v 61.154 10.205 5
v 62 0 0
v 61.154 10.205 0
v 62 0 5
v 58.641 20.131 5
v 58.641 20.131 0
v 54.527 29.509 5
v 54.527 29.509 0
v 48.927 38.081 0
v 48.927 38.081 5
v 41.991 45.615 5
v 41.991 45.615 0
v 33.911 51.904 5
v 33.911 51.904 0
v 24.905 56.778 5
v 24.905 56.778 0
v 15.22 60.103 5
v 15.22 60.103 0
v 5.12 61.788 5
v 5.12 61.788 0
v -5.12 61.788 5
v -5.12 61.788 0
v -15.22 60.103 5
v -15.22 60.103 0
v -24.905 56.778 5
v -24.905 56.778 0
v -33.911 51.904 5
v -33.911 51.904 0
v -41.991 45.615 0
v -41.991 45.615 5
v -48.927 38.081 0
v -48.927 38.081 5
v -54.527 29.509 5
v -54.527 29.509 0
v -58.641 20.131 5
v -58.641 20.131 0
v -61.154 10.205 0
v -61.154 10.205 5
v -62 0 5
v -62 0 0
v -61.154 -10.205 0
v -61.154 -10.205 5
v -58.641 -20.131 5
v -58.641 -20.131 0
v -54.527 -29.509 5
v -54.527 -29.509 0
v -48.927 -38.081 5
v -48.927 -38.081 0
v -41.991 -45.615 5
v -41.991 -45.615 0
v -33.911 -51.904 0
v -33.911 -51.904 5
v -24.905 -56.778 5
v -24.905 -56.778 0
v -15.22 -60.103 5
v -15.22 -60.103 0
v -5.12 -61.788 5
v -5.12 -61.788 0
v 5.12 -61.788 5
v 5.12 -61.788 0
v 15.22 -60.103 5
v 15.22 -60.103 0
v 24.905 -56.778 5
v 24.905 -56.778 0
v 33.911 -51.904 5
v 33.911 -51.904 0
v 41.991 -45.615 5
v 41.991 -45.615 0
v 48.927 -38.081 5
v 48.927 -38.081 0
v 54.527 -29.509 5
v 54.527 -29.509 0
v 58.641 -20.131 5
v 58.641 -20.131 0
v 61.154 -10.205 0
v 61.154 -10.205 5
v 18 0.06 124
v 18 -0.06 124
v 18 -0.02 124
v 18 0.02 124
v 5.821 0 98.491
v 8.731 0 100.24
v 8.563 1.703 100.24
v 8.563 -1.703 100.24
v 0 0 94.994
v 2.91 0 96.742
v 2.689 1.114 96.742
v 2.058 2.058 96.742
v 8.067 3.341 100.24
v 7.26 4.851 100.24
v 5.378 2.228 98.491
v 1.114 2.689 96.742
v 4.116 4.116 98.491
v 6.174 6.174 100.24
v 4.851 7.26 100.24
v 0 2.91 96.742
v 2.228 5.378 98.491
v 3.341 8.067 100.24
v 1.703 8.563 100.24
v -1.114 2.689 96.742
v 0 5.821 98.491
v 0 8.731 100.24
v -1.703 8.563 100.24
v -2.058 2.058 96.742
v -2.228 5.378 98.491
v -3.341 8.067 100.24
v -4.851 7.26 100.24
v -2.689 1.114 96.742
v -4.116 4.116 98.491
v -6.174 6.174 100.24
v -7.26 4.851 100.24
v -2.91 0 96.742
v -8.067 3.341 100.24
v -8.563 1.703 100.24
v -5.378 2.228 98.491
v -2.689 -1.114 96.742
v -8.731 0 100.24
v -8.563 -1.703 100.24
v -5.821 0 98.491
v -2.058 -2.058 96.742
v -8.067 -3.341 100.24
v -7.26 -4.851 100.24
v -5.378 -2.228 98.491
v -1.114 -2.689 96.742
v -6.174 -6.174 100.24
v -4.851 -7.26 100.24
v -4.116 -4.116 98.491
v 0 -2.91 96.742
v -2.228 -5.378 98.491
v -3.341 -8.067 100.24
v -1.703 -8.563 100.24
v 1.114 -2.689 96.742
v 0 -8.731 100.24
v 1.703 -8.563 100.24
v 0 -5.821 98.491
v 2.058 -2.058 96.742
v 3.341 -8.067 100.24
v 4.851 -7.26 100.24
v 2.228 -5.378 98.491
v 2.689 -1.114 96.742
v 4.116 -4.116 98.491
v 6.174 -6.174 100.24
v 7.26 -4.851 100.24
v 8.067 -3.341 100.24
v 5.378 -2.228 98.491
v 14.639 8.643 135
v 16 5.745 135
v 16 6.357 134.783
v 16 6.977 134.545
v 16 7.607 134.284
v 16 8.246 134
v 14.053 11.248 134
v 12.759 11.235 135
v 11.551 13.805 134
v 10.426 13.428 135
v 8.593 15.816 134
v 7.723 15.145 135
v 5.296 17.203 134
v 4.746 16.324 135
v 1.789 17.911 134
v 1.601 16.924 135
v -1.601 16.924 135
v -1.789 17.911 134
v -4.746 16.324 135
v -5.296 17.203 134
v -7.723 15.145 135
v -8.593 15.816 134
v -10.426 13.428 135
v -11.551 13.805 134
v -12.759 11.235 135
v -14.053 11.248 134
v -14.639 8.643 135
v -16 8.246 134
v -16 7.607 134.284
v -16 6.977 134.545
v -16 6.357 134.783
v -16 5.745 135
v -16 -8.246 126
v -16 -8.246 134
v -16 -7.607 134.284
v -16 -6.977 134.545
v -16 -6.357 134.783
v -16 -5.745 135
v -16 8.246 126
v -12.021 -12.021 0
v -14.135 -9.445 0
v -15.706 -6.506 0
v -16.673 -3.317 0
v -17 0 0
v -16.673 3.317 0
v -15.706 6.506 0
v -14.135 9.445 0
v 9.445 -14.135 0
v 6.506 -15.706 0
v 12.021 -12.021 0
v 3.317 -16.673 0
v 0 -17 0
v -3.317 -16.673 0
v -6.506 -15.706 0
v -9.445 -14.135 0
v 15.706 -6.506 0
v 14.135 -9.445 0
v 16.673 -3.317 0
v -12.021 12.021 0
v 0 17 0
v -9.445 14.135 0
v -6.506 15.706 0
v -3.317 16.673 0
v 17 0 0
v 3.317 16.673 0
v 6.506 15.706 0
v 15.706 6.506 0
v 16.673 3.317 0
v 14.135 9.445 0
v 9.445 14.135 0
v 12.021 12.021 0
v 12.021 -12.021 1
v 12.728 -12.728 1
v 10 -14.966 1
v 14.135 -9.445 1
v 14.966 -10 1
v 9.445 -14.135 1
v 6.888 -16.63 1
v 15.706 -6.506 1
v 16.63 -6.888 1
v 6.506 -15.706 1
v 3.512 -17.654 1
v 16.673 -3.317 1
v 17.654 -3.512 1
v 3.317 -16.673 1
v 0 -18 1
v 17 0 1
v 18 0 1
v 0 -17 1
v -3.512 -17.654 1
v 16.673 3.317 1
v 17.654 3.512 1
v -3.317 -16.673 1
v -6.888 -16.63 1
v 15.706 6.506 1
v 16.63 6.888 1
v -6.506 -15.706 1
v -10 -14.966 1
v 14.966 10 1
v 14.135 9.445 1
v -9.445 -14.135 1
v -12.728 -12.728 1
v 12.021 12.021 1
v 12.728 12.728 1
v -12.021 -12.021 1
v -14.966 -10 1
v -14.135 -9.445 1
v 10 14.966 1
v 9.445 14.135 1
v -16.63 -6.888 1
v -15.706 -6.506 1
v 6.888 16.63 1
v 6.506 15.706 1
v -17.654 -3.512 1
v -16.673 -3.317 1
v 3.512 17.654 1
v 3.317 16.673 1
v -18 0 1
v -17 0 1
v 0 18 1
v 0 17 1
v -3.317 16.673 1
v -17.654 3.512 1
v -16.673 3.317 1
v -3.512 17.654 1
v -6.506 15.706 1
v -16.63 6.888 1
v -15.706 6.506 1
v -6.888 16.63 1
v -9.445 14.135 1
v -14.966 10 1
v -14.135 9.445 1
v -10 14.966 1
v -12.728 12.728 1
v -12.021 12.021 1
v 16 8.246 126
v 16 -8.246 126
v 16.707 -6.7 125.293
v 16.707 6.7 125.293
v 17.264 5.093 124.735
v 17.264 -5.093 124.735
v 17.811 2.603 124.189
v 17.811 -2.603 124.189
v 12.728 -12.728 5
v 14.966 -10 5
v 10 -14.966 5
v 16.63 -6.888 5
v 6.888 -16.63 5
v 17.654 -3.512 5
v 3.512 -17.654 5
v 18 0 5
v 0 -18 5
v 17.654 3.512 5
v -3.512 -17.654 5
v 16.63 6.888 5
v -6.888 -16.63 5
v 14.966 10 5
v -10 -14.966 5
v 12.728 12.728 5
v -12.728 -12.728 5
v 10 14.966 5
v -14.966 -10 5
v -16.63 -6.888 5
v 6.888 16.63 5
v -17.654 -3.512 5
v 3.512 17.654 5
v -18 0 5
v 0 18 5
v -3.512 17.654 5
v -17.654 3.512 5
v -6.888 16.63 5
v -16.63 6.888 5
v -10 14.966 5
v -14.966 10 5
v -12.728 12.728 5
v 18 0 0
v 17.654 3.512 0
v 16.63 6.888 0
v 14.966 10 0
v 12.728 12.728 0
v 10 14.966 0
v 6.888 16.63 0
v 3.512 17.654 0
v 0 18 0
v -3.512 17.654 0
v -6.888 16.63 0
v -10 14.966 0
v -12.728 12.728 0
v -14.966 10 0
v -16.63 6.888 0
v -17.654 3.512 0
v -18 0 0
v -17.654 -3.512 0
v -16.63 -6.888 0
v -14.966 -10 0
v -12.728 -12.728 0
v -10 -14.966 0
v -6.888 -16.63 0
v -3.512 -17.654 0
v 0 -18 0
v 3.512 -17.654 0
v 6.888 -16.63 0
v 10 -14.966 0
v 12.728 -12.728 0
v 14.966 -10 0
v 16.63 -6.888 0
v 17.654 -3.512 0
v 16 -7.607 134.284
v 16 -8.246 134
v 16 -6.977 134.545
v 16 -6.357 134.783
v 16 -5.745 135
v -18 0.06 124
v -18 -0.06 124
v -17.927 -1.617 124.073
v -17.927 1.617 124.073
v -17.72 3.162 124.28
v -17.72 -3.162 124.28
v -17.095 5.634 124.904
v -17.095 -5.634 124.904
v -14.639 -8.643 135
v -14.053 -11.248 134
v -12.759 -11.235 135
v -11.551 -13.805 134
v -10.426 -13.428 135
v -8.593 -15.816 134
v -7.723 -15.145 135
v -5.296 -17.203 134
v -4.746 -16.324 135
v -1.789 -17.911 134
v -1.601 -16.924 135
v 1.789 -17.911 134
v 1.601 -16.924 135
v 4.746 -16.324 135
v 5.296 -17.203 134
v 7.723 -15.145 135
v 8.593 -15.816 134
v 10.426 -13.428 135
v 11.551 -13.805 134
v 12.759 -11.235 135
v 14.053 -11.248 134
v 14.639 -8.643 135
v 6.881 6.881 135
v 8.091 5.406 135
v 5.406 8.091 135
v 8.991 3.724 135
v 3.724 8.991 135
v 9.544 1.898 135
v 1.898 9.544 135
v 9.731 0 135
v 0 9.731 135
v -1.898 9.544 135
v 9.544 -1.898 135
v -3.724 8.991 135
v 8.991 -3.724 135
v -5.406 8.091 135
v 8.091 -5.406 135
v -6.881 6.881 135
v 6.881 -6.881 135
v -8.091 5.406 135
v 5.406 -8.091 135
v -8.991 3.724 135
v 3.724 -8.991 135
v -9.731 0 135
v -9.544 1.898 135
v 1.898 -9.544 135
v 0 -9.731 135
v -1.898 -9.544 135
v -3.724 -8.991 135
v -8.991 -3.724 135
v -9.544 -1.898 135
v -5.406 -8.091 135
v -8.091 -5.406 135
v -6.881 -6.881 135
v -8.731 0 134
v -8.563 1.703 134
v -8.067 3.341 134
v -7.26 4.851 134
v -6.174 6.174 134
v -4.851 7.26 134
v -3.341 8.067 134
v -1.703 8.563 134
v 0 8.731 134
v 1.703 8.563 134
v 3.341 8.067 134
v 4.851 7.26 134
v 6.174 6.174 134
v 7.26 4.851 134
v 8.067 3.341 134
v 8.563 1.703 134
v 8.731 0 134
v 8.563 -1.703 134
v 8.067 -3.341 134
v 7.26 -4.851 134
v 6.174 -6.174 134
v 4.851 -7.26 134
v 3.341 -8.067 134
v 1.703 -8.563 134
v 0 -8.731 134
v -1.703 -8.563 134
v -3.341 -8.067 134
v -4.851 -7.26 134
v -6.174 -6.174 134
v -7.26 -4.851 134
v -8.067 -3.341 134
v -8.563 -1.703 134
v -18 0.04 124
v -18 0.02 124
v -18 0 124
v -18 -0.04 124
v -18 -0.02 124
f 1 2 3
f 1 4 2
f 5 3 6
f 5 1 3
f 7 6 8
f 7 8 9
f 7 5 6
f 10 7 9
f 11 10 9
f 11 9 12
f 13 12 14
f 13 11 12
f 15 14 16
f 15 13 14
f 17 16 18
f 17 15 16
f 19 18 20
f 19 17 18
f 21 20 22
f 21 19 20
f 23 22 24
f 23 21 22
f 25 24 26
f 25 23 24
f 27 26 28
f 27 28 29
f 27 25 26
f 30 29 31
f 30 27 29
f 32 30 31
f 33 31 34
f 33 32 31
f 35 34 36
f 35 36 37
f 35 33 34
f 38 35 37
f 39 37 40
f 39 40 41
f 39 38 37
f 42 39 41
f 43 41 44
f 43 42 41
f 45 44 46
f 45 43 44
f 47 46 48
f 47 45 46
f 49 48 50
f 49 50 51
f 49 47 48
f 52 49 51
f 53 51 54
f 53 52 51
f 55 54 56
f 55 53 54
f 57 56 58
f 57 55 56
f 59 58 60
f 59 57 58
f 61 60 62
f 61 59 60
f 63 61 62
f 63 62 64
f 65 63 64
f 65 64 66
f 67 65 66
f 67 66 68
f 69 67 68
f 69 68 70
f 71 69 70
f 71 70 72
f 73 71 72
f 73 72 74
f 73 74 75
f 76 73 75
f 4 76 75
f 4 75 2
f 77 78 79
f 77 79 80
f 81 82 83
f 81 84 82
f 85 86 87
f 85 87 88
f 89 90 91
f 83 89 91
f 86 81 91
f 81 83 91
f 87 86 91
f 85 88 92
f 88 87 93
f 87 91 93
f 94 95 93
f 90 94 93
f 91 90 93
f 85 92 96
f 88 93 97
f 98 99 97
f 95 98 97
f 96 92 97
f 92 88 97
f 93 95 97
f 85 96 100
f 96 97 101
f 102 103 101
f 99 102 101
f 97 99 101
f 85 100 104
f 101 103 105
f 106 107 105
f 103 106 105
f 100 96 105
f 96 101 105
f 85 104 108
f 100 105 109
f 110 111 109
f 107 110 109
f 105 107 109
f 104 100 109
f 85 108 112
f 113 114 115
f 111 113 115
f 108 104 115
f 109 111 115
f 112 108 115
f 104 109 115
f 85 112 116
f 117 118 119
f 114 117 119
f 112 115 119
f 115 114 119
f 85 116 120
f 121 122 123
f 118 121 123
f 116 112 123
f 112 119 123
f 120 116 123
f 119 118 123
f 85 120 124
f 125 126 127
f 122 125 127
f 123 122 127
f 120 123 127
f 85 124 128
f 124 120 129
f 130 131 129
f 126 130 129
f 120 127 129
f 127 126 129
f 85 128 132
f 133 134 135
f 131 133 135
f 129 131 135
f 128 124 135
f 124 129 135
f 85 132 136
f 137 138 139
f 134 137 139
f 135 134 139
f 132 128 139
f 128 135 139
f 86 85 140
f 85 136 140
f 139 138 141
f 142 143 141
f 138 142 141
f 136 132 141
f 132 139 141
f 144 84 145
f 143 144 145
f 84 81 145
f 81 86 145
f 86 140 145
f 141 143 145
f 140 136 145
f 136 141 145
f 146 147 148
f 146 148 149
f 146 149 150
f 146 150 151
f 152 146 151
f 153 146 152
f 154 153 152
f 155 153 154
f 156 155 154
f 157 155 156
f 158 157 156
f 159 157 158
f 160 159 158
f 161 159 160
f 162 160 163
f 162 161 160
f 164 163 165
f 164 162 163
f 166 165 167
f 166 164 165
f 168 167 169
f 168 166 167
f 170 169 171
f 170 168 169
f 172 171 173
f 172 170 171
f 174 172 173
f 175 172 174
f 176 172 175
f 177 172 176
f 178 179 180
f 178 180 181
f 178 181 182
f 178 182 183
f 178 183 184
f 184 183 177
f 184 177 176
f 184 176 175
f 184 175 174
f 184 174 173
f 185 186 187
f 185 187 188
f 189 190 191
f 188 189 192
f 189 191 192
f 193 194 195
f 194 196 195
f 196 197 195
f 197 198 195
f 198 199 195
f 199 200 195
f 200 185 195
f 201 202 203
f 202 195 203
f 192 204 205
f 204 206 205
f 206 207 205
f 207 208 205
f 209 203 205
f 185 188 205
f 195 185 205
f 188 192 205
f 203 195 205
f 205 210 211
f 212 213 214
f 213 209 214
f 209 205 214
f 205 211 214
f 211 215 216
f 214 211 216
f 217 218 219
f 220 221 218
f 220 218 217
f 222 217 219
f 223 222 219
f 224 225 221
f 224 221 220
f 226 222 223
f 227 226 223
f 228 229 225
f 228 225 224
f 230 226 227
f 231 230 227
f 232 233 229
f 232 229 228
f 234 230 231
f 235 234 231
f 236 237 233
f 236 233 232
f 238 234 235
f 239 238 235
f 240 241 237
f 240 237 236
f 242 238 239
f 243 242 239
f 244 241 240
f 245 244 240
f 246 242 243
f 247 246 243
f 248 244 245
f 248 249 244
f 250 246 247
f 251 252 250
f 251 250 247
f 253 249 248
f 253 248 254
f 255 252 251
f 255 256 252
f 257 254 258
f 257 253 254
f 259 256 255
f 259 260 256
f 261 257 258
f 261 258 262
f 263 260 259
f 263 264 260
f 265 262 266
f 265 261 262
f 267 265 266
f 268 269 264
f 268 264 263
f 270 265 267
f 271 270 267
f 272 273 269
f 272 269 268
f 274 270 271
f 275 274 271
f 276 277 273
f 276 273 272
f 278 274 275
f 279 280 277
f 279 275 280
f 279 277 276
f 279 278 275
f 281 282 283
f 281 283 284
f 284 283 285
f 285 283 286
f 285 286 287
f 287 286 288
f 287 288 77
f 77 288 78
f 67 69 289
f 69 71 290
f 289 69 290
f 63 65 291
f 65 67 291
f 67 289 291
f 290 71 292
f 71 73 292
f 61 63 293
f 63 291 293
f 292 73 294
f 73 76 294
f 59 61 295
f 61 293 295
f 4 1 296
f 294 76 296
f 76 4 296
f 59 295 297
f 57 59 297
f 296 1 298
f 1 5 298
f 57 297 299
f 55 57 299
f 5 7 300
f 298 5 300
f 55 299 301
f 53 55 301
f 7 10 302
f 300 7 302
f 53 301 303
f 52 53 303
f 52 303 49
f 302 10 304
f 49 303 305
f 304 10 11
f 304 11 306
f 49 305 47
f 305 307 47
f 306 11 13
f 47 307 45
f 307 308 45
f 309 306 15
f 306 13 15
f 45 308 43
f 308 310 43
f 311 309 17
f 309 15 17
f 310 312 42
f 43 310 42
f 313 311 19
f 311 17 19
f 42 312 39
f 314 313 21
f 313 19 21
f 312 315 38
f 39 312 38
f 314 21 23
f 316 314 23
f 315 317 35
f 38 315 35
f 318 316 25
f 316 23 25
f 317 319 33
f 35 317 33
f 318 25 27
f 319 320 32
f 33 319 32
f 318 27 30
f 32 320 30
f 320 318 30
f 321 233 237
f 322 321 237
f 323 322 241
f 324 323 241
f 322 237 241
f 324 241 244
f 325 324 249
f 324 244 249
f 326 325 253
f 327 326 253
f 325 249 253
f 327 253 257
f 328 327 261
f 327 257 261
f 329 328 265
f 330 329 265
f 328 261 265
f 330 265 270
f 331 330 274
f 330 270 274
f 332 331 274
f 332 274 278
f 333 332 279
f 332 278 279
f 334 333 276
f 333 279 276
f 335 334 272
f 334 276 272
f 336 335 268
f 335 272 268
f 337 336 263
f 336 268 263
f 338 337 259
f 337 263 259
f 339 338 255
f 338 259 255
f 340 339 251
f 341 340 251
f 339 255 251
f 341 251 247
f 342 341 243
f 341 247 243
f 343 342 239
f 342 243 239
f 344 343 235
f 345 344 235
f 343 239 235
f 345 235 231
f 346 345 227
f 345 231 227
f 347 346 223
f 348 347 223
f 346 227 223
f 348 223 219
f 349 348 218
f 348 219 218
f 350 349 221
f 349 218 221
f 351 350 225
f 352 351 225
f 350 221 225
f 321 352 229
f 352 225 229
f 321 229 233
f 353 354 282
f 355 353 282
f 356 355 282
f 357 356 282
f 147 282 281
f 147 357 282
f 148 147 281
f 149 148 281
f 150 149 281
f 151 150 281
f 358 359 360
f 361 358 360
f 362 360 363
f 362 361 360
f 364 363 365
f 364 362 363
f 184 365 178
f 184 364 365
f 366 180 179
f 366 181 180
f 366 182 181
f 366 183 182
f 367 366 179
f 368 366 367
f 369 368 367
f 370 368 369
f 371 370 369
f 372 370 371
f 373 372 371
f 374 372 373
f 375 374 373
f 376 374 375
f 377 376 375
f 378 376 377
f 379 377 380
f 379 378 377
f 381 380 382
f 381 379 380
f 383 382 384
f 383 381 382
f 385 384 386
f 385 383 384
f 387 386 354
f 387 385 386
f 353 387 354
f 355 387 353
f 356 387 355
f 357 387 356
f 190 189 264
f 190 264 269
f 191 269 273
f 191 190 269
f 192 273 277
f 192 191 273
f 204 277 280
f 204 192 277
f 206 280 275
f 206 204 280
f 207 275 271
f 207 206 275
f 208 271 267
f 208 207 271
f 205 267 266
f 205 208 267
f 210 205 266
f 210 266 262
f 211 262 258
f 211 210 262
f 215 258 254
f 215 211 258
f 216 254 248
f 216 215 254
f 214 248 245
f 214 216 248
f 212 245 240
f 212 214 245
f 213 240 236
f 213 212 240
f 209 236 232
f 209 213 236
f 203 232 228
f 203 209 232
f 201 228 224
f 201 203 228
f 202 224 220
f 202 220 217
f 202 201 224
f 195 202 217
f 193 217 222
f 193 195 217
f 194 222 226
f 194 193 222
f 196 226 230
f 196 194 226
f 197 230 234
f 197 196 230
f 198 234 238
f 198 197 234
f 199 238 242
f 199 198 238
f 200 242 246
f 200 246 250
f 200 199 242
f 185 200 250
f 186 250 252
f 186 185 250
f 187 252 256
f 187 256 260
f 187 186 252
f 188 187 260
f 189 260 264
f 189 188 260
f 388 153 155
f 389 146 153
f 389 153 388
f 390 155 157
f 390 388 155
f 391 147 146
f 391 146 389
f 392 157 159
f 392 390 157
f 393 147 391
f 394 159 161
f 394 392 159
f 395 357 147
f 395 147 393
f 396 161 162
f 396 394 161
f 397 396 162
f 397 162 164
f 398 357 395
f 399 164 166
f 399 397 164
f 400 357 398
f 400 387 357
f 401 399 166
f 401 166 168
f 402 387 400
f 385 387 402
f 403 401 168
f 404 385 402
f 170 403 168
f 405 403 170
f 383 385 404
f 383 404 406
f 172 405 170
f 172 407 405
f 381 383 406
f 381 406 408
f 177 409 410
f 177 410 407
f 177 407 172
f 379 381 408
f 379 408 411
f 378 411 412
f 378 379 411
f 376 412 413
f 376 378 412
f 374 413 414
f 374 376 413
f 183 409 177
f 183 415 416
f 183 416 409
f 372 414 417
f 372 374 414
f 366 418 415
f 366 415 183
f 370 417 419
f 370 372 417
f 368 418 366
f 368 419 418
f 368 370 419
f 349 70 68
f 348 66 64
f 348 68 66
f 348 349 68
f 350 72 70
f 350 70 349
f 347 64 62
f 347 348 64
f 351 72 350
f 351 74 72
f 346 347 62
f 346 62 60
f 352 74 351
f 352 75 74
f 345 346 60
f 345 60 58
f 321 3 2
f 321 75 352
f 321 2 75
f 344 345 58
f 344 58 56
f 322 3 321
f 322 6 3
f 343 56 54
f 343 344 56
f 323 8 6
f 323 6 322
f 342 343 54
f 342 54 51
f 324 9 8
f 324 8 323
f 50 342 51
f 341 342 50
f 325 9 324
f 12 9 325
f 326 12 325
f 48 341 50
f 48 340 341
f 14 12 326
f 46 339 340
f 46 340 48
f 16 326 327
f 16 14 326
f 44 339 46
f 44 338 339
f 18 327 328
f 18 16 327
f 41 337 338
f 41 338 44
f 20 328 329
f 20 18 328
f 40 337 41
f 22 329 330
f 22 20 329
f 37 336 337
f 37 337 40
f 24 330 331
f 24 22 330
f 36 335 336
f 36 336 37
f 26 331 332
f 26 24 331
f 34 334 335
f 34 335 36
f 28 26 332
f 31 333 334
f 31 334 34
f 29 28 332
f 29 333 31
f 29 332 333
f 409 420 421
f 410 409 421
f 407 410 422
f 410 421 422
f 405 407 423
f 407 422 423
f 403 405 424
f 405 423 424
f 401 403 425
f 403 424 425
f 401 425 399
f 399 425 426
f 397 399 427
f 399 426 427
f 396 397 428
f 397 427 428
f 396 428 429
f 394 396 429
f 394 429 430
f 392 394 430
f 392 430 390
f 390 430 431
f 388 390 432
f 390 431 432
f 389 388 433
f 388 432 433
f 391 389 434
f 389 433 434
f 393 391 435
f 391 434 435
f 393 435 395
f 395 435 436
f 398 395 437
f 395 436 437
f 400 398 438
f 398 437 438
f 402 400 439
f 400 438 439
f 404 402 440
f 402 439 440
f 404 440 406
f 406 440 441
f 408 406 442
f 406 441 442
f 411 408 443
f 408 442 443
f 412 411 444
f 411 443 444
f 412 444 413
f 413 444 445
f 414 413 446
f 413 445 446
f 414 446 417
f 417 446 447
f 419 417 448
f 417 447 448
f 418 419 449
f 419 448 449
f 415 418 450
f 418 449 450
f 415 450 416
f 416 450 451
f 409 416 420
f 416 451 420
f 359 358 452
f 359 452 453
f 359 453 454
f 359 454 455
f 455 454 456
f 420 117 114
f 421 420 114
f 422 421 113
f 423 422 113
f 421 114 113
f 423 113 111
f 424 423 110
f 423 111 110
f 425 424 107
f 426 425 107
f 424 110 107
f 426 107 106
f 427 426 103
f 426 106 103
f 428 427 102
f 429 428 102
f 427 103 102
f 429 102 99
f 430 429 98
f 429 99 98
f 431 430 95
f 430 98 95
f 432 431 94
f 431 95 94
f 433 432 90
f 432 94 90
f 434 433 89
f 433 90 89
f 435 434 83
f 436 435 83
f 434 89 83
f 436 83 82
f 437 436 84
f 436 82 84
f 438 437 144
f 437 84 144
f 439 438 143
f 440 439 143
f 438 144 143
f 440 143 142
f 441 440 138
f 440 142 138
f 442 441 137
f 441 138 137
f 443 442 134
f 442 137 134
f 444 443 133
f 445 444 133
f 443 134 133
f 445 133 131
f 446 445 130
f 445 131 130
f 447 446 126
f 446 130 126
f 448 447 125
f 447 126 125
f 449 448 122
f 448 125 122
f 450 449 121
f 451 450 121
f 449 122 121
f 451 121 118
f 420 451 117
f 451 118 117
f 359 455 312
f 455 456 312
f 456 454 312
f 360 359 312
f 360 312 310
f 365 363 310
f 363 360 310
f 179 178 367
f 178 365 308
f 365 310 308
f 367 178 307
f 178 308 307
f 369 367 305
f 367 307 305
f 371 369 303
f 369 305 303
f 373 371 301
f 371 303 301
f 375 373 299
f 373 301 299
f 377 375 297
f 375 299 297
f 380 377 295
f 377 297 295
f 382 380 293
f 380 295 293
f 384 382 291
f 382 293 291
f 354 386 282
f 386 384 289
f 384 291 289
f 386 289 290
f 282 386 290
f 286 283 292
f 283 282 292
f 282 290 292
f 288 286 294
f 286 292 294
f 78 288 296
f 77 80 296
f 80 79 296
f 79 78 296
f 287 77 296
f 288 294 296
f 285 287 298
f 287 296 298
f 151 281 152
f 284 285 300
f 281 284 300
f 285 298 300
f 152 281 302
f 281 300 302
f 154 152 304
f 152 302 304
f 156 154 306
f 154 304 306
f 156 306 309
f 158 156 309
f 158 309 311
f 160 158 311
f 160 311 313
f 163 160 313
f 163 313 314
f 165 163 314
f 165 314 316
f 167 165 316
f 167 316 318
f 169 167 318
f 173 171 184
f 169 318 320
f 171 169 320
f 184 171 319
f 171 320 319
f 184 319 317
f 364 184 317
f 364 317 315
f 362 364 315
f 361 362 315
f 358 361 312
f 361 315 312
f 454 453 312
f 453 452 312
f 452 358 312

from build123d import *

# Parameters (mm, degrees)
SKETCH1_R                   = 18
BASE_EXTRUDE_DEPTH          = 5
SKETCH6_R                   = 18
SKETCH6_R_2                 = 17
CUT_EXTRUDE1_DEPTH          = 1
SKETCH7_R                   = 18
BOSS_EXTRUDE1_DEPTH         = 130
CHAMFER1_SIZE               = 1
SKETCH2_W                   = 10
SKETCH2_H                   = 30
WRENCHFLATS_DEPTH           = 11
WRENCHFLATSCHAMFER_SIZE     = 2
SKETCH3_R                   = 5
INTERNALTHREAD_DEPTH        = 30
INTERNALTHREADCHAMFER_SIZE  = 1.2
PISTON_OUTLINE_W            = 44
PISTON_OUTLINE_H            = 5
F_3_4_16_TAPPED_HOLE1_D     = 17.4625
F_3_4_16_TAPPED_HOLE1_DEPTH = 34.76
F_3_4_16_TAPPED_HOLE1_TIP   = 5.24626428
CHAMFER2_SIZE               = 1


# Read off the part's stored shape, not the designer's step: Piston
with BuildPart() as part:
    # Sketch1 → Base-Extrude (new body)
    with BuildSketch(Plane.XY):
        Circle(SKETCH1_R)
    extrude(amount=BASE_EXTRUDE_DEPTH)

    # Sketch6 → Cut-Extrude1 (cut)
    with BuildSketch(Plane(origin=(0, 0, 0), x_dir=(-1, 0, 0), z_dir=(0, 0, -1))):
        Circle(SKETCH6_R)
        Circle(SKETCH6_R_2, mode=Mode.SUBTRACT)
    extrude(amount=-CUT_EXTRUDE1_DEPTH, mode=Mode.SUBTRACT)

    # Sketch7 → Boss-Extrude1 (add)
    with BuildSketch(Plane.XY.offset(5)):
        with Locations(Location((0, 0, 0), (0, 0, 180))):
            Circle(SKETCH7_R)
    extrude(amount=BOSS_EXTRUDE1_DEPTH)

    # Chamfer1
    chamfer1_edges = [part.edges().sort_by_distance(p)[0] for p in [
        (18, 0, 135),
    ]]
    chamfer(chamfer1_edges, length=CHAMFER1_SIZE)

    # Sketch2 → WrenchFlats (cut)
    with BuildSketch(Plane.XY.offset(135)):
        with Locations((21, 0)):
            Rectangle(SKETCH2_W, SKETCH2_H)
        with Locations((-21, 0)):
            Rectangle(SKETCH2_W, SKETCH2_H)
    extrude(amount=-WRENCHFLATS_DEPTH, mode=Mode.SUBTRACT)

    # WrenchFlatsChamfer
    wrenchflatschamfer_edges = [part.edges().sort_by_distance(p)[0] for p in [
        (16, 0, 124),
        (-16, 0, 124),
    ]]
    chamfer(wrenchflatschamfer_edges, length=WRENCHFLATSCHAMFER_SIZE - 0.0001)  # a hair under: the kernel refuses the full size

    # Sketch3 → InternalThread (cut)
    with BuildSketch(Plane.XY.offset(135)):
        Circle(SKETCH3_R)
    extrude(amount=-INTERNALTHREAD_DEPTH, mode=Mode.SUBTRACT)

    # InternalThreadChamfer
    internalthreadchamfer_edges = [part.edges().sort_by_distance(p)[0] for p in [
        (-5, 0, 135),
    ]]
    chamfer(internalthreadchamfer_edges, length=INTERNALTHREADCHAMFER_SIZE)

    # Piston outline → Piston (revolve)
    with BuildSketch(Plane.XZ):
        with Locations((40, 2.5)):
            Rectangle(PISTON_OUTLINE_W, PISTON_OUTLINE_H)
    revolve(axis=Axis((0, 0, 0), (0, 0, 1)))

    # 3/4-16 Tapped Hole1
    with Locations(Plane.XY.offset(135)):
        with Locations((0, 0)):
            Hole(F_3_4_16_TAPPED_HOLE1_D / 2, depth=F_3_4_16_TAPPED_HOLE1_DEPTH)
            with Locations((0, 0, -(F_3_4_16_TAPPED_HOLE1_DEPTH + F_3_4_16_TAPPED_HOLE1_TIP / 2))):  # 118° drill point
                Cone(0, F_3_4_16_TAPPED_HOLE1_D / 2, F_3_4_16_TAPPED_HOLE1_TIP, mode=Mode.SUBTRACT)

    # Chamfer2
    chamfer2_edges = [part.edges().sort_by_distance(p)[0] for p in [
        (8.73125, 0, 135),
    ]]
    chamfer(chamfer2_edges, length=CHAMFER2_SIZE)


solid = part.part
